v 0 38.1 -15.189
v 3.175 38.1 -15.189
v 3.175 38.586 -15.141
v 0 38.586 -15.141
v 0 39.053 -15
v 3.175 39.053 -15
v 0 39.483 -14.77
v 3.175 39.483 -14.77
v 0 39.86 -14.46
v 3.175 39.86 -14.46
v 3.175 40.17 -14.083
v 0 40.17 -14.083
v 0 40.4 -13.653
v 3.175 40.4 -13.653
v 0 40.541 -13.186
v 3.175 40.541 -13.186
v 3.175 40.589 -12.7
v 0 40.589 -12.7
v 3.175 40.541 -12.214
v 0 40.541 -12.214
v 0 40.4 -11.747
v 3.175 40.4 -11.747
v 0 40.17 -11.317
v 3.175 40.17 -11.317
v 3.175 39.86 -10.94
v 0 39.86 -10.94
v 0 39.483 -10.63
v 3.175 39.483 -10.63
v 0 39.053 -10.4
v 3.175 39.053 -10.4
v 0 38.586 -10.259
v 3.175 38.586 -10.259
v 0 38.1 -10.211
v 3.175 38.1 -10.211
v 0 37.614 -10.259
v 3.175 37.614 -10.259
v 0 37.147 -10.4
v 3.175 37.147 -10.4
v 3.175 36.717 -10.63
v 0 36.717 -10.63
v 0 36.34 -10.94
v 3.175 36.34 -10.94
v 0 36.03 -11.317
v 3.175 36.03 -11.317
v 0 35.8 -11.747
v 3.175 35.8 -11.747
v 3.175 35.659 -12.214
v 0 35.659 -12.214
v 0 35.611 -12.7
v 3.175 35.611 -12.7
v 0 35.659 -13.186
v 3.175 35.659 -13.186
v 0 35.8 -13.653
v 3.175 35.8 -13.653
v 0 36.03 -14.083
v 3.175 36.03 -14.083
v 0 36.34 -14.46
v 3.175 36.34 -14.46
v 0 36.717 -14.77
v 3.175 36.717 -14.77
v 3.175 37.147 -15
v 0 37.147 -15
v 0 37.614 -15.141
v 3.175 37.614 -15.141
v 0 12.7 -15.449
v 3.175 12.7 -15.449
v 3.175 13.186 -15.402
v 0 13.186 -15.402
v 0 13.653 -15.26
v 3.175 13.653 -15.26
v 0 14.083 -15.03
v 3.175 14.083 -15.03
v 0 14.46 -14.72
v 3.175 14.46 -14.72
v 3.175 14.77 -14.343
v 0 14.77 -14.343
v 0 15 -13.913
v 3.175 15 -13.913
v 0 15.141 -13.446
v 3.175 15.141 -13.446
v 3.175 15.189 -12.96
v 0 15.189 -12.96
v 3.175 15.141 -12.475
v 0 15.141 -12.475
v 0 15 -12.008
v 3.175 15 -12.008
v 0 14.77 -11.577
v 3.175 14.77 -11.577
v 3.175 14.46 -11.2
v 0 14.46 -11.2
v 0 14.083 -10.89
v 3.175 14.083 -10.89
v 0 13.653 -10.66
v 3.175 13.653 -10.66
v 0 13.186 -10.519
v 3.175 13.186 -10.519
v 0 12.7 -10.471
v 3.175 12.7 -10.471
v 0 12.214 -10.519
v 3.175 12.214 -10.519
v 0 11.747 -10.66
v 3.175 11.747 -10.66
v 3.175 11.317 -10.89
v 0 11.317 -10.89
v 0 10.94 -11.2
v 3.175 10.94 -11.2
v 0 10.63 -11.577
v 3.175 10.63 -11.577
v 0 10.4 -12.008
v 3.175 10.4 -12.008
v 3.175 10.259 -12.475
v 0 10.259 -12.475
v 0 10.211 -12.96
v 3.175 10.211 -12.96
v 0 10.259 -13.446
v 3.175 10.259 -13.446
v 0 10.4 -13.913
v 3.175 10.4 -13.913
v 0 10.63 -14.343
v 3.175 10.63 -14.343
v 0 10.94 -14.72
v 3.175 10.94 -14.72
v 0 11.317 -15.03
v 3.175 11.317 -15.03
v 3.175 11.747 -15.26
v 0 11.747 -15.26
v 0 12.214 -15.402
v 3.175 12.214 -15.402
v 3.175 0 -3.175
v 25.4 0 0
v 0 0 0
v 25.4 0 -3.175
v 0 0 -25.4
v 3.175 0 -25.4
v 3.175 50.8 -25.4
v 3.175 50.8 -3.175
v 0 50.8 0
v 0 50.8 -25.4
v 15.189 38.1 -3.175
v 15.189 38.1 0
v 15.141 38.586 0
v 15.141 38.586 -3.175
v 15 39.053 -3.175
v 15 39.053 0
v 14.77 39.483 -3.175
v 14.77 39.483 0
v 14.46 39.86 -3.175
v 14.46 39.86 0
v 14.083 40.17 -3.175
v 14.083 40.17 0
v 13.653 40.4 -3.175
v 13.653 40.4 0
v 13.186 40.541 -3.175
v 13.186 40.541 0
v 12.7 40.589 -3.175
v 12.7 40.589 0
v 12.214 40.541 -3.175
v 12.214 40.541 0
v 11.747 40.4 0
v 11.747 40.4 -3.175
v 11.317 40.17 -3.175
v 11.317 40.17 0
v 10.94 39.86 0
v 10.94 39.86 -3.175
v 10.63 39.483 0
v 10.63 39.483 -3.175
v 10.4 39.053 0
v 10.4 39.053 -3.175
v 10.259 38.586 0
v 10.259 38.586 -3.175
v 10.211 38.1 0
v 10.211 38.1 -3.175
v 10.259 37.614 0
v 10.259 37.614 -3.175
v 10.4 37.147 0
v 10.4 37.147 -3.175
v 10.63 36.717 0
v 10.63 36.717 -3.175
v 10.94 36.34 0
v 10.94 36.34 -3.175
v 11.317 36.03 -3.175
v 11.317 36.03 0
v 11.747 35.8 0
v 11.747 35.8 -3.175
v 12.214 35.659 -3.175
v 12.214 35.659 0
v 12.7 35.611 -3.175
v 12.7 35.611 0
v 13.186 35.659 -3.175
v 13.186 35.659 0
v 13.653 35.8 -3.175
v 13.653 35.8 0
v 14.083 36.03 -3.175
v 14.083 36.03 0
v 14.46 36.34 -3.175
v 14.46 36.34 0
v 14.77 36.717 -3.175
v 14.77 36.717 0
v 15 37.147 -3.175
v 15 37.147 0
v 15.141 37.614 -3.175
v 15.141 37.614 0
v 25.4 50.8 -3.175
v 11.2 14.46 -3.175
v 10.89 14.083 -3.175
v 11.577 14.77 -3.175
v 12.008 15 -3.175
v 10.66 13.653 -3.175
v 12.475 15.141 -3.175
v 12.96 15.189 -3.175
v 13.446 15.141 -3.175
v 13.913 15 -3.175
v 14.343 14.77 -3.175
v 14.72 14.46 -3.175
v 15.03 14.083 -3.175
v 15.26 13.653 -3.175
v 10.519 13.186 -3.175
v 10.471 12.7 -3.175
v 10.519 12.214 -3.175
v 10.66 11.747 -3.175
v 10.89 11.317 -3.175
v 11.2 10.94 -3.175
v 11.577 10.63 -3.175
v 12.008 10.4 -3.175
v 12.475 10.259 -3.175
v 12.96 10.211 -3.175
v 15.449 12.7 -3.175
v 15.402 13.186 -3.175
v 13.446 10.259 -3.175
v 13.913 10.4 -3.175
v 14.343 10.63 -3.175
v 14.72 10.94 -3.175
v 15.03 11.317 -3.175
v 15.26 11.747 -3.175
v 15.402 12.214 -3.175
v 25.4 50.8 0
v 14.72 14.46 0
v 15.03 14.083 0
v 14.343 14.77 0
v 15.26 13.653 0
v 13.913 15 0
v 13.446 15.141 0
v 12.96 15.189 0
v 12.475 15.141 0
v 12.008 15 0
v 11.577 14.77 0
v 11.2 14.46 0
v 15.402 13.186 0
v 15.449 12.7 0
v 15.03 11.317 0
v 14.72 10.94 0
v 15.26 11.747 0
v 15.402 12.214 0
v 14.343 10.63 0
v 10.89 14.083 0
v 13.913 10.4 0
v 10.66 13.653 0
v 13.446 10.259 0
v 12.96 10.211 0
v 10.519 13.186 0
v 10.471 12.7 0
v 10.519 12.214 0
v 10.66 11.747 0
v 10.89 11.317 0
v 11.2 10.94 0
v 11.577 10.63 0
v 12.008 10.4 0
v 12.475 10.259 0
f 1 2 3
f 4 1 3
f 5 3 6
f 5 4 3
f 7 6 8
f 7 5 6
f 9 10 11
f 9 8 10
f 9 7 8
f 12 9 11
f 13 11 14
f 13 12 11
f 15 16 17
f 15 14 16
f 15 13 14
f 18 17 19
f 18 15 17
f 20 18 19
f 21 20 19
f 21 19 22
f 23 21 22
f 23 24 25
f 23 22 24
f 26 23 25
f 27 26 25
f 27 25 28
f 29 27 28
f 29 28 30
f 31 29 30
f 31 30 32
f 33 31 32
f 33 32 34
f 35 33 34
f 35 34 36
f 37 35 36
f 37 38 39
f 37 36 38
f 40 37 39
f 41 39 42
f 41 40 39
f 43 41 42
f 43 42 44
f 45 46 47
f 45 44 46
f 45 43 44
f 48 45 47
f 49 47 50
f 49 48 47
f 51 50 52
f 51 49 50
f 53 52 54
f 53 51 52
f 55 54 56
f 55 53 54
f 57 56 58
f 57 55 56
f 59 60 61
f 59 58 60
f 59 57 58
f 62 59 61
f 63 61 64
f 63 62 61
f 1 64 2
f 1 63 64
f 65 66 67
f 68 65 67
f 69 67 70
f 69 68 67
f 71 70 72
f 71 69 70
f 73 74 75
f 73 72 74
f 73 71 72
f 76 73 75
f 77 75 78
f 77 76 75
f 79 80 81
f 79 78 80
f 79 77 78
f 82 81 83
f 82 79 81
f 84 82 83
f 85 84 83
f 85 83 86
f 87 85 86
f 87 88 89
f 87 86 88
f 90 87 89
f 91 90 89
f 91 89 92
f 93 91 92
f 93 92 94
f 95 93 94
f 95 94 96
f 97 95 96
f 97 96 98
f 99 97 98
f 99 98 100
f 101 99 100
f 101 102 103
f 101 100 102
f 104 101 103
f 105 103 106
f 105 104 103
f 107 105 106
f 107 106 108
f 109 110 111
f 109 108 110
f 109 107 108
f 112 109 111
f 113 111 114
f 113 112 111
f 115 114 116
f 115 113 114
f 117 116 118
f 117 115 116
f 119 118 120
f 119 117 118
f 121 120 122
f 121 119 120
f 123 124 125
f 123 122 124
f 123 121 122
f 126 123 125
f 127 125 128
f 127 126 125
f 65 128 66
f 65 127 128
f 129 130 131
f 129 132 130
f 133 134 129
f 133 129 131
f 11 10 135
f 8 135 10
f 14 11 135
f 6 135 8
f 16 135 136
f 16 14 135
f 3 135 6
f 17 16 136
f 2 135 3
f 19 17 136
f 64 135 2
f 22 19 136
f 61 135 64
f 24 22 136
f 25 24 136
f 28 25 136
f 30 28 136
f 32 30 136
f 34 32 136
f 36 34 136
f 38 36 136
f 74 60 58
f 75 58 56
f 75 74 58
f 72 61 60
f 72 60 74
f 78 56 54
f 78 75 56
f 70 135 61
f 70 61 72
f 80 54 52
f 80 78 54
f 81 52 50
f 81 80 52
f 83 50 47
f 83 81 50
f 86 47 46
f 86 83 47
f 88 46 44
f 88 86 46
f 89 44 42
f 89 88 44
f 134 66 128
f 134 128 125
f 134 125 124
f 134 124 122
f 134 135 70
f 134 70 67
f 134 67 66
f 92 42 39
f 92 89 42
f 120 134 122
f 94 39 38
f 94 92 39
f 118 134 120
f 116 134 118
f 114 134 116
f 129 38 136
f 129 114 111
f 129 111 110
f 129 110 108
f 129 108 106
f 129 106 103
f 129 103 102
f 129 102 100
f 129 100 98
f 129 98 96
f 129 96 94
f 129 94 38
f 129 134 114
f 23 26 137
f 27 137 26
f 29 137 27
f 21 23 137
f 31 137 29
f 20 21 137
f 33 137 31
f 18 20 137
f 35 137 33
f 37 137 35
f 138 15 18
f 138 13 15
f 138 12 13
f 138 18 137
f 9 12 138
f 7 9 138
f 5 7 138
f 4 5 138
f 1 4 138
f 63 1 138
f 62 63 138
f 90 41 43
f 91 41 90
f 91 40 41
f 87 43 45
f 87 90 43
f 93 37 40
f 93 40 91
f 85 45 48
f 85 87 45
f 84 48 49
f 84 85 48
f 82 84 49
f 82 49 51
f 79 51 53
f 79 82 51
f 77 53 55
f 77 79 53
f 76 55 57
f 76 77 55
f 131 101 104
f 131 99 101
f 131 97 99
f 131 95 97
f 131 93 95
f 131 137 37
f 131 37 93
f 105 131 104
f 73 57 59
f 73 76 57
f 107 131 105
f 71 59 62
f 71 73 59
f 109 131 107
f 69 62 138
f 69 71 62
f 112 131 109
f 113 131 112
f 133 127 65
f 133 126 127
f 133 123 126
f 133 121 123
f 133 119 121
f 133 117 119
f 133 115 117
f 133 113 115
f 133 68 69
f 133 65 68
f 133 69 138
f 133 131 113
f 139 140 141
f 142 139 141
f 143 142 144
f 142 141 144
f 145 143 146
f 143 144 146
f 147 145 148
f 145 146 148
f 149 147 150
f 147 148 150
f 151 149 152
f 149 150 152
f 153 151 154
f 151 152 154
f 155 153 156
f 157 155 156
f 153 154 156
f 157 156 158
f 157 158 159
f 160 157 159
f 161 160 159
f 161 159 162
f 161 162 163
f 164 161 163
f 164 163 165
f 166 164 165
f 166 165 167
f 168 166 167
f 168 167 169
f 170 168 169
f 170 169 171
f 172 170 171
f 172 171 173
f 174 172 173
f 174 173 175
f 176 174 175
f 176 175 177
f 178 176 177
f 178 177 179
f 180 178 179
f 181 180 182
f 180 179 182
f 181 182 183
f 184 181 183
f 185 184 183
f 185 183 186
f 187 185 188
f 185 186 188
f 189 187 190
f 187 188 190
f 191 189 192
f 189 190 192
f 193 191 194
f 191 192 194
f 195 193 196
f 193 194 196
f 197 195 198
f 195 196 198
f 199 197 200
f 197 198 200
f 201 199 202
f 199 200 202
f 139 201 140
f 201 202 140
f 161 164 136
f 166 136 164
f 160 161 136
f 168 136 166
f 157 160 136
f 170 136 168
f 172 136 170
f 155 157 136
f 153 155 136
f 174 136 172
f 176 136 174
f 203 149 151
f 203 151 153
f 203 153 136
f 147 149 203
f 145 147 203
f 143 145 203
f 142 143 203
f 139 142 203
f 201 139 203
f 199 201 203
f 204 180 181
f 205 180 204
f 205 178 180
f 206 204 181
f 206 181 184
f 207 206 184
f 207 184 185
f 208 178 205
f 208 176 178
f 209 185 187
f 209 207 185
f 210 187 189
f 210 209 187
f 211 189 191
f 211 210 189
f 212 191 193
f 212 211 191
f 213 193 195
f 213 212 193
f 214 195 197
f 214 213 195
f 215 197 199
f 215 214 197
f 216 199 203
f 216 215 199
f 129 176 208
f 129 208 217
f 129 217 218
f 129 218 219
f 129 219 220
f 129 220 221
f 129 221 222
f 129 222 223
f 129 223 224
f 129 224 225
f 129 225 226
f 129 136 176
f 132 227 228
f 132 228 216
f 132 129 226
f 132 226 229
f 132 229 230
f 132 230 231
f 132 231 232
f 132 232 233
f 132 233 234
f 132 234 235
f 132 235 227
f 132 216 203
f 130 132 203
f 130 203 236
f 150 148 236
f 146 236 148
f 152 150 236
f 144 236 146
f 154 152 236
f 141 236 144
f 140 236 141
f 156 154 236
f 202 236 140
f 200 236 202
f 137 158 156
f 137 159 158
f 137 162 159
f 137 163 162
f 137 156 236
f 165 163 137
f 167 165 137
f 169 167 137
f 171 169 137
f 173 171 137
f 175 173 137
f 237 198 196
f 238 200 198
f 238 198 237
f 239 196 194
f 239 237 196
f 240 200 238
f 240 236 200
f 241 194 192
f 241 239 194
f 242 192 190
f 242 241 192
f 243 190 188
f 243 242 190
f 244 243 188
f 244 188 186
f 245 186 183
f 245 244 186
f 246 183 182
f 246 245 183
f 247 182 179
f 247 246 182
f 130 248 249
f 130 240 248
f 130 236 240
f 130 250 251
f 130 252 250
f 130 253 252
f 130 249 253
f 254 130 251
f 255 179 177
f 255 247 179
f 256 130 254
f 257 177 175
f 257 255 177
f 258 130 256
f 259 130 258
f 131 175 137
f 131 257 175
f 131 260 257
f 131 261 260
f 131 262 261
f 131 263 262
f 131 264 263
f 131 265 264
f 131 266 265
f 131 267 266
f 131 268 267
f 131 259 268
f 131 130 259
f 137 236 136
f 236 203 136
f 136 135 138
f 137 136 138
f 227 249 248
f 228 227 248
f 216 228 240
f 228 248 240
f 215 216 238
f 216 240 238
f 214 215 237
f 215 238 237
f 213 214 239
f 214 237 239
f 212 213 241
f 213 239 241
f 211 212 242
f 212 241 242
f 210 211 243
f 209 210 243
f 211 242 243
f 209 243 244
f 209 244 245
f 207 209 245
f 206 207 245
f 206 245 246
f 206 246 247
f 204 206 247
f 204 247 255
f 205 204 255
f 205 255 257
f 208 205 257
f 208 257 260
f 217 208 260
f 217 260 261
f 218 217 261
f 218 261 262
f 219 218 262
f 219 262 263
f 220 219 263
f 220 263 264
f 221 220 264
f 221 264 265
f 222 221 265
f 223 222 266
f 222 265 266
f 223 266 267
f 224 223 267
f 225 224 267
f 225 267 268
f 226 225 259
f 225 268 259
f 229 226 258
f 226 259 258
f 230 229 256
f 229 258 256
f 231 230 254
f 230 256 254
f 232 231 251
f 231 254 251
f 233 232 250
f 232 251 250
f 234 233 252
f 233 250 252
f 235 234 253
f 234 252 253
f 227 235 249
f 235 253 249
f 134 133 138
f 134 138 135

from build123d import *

# Parameters (mm, degrees)
EXTRUDE_THIN1_DEPTH            = 50.8
F_9_0_196_DIAMETER_HOLE1_D     = 4.9784
F_9_0_196_DIAMETER_HOLE1_DEPTH = 3.176


with BuildPart() as part:
    # Sketch1 → Extrude-Thin1 (new body)
    with BuildSketch(Plane(origin=(0, 0, 0), x_dir=(1, 0, 0), z_dir=(0, 1, 0))):
        Polygon((25.4, 0), (0, 0), (0, 25.4), (3.175, 25.4), (3.175, 3.175), (25.4, 3.175), align=None)
    extrude(amount=EXTRUDE_THIN1_DEPTH)

    # #9 (0.196) Diameter Hole1
    with Locations(Plane(origin=(0, 0, -3.175), x_dir=(-1, 0, 0), z_dir=(0, 0, -1))):
        with Locations((-12.960193373, 12.7), (-12.7, 38.1)):
            f_9_0_196_diameter_hole1 = Hole(F_9_0_196_DIAMETER_HOLE1_D / 2, depth=F_9_0_196_DIAMETER_HOLE1_DEPTH)

    # Mirror1: #9 (0.196) Diameter Hole1 across plane
    add(f_9_0_196_diameter_hole1.mirror(Plane(origin=(0, 0, 0), x_dir=(-0.707106781, 0, 0.707106781), z_dir=(-0.707106781, 0, -0.707106781))), mode=Mode.SUBTRACT)


solid = part.part
